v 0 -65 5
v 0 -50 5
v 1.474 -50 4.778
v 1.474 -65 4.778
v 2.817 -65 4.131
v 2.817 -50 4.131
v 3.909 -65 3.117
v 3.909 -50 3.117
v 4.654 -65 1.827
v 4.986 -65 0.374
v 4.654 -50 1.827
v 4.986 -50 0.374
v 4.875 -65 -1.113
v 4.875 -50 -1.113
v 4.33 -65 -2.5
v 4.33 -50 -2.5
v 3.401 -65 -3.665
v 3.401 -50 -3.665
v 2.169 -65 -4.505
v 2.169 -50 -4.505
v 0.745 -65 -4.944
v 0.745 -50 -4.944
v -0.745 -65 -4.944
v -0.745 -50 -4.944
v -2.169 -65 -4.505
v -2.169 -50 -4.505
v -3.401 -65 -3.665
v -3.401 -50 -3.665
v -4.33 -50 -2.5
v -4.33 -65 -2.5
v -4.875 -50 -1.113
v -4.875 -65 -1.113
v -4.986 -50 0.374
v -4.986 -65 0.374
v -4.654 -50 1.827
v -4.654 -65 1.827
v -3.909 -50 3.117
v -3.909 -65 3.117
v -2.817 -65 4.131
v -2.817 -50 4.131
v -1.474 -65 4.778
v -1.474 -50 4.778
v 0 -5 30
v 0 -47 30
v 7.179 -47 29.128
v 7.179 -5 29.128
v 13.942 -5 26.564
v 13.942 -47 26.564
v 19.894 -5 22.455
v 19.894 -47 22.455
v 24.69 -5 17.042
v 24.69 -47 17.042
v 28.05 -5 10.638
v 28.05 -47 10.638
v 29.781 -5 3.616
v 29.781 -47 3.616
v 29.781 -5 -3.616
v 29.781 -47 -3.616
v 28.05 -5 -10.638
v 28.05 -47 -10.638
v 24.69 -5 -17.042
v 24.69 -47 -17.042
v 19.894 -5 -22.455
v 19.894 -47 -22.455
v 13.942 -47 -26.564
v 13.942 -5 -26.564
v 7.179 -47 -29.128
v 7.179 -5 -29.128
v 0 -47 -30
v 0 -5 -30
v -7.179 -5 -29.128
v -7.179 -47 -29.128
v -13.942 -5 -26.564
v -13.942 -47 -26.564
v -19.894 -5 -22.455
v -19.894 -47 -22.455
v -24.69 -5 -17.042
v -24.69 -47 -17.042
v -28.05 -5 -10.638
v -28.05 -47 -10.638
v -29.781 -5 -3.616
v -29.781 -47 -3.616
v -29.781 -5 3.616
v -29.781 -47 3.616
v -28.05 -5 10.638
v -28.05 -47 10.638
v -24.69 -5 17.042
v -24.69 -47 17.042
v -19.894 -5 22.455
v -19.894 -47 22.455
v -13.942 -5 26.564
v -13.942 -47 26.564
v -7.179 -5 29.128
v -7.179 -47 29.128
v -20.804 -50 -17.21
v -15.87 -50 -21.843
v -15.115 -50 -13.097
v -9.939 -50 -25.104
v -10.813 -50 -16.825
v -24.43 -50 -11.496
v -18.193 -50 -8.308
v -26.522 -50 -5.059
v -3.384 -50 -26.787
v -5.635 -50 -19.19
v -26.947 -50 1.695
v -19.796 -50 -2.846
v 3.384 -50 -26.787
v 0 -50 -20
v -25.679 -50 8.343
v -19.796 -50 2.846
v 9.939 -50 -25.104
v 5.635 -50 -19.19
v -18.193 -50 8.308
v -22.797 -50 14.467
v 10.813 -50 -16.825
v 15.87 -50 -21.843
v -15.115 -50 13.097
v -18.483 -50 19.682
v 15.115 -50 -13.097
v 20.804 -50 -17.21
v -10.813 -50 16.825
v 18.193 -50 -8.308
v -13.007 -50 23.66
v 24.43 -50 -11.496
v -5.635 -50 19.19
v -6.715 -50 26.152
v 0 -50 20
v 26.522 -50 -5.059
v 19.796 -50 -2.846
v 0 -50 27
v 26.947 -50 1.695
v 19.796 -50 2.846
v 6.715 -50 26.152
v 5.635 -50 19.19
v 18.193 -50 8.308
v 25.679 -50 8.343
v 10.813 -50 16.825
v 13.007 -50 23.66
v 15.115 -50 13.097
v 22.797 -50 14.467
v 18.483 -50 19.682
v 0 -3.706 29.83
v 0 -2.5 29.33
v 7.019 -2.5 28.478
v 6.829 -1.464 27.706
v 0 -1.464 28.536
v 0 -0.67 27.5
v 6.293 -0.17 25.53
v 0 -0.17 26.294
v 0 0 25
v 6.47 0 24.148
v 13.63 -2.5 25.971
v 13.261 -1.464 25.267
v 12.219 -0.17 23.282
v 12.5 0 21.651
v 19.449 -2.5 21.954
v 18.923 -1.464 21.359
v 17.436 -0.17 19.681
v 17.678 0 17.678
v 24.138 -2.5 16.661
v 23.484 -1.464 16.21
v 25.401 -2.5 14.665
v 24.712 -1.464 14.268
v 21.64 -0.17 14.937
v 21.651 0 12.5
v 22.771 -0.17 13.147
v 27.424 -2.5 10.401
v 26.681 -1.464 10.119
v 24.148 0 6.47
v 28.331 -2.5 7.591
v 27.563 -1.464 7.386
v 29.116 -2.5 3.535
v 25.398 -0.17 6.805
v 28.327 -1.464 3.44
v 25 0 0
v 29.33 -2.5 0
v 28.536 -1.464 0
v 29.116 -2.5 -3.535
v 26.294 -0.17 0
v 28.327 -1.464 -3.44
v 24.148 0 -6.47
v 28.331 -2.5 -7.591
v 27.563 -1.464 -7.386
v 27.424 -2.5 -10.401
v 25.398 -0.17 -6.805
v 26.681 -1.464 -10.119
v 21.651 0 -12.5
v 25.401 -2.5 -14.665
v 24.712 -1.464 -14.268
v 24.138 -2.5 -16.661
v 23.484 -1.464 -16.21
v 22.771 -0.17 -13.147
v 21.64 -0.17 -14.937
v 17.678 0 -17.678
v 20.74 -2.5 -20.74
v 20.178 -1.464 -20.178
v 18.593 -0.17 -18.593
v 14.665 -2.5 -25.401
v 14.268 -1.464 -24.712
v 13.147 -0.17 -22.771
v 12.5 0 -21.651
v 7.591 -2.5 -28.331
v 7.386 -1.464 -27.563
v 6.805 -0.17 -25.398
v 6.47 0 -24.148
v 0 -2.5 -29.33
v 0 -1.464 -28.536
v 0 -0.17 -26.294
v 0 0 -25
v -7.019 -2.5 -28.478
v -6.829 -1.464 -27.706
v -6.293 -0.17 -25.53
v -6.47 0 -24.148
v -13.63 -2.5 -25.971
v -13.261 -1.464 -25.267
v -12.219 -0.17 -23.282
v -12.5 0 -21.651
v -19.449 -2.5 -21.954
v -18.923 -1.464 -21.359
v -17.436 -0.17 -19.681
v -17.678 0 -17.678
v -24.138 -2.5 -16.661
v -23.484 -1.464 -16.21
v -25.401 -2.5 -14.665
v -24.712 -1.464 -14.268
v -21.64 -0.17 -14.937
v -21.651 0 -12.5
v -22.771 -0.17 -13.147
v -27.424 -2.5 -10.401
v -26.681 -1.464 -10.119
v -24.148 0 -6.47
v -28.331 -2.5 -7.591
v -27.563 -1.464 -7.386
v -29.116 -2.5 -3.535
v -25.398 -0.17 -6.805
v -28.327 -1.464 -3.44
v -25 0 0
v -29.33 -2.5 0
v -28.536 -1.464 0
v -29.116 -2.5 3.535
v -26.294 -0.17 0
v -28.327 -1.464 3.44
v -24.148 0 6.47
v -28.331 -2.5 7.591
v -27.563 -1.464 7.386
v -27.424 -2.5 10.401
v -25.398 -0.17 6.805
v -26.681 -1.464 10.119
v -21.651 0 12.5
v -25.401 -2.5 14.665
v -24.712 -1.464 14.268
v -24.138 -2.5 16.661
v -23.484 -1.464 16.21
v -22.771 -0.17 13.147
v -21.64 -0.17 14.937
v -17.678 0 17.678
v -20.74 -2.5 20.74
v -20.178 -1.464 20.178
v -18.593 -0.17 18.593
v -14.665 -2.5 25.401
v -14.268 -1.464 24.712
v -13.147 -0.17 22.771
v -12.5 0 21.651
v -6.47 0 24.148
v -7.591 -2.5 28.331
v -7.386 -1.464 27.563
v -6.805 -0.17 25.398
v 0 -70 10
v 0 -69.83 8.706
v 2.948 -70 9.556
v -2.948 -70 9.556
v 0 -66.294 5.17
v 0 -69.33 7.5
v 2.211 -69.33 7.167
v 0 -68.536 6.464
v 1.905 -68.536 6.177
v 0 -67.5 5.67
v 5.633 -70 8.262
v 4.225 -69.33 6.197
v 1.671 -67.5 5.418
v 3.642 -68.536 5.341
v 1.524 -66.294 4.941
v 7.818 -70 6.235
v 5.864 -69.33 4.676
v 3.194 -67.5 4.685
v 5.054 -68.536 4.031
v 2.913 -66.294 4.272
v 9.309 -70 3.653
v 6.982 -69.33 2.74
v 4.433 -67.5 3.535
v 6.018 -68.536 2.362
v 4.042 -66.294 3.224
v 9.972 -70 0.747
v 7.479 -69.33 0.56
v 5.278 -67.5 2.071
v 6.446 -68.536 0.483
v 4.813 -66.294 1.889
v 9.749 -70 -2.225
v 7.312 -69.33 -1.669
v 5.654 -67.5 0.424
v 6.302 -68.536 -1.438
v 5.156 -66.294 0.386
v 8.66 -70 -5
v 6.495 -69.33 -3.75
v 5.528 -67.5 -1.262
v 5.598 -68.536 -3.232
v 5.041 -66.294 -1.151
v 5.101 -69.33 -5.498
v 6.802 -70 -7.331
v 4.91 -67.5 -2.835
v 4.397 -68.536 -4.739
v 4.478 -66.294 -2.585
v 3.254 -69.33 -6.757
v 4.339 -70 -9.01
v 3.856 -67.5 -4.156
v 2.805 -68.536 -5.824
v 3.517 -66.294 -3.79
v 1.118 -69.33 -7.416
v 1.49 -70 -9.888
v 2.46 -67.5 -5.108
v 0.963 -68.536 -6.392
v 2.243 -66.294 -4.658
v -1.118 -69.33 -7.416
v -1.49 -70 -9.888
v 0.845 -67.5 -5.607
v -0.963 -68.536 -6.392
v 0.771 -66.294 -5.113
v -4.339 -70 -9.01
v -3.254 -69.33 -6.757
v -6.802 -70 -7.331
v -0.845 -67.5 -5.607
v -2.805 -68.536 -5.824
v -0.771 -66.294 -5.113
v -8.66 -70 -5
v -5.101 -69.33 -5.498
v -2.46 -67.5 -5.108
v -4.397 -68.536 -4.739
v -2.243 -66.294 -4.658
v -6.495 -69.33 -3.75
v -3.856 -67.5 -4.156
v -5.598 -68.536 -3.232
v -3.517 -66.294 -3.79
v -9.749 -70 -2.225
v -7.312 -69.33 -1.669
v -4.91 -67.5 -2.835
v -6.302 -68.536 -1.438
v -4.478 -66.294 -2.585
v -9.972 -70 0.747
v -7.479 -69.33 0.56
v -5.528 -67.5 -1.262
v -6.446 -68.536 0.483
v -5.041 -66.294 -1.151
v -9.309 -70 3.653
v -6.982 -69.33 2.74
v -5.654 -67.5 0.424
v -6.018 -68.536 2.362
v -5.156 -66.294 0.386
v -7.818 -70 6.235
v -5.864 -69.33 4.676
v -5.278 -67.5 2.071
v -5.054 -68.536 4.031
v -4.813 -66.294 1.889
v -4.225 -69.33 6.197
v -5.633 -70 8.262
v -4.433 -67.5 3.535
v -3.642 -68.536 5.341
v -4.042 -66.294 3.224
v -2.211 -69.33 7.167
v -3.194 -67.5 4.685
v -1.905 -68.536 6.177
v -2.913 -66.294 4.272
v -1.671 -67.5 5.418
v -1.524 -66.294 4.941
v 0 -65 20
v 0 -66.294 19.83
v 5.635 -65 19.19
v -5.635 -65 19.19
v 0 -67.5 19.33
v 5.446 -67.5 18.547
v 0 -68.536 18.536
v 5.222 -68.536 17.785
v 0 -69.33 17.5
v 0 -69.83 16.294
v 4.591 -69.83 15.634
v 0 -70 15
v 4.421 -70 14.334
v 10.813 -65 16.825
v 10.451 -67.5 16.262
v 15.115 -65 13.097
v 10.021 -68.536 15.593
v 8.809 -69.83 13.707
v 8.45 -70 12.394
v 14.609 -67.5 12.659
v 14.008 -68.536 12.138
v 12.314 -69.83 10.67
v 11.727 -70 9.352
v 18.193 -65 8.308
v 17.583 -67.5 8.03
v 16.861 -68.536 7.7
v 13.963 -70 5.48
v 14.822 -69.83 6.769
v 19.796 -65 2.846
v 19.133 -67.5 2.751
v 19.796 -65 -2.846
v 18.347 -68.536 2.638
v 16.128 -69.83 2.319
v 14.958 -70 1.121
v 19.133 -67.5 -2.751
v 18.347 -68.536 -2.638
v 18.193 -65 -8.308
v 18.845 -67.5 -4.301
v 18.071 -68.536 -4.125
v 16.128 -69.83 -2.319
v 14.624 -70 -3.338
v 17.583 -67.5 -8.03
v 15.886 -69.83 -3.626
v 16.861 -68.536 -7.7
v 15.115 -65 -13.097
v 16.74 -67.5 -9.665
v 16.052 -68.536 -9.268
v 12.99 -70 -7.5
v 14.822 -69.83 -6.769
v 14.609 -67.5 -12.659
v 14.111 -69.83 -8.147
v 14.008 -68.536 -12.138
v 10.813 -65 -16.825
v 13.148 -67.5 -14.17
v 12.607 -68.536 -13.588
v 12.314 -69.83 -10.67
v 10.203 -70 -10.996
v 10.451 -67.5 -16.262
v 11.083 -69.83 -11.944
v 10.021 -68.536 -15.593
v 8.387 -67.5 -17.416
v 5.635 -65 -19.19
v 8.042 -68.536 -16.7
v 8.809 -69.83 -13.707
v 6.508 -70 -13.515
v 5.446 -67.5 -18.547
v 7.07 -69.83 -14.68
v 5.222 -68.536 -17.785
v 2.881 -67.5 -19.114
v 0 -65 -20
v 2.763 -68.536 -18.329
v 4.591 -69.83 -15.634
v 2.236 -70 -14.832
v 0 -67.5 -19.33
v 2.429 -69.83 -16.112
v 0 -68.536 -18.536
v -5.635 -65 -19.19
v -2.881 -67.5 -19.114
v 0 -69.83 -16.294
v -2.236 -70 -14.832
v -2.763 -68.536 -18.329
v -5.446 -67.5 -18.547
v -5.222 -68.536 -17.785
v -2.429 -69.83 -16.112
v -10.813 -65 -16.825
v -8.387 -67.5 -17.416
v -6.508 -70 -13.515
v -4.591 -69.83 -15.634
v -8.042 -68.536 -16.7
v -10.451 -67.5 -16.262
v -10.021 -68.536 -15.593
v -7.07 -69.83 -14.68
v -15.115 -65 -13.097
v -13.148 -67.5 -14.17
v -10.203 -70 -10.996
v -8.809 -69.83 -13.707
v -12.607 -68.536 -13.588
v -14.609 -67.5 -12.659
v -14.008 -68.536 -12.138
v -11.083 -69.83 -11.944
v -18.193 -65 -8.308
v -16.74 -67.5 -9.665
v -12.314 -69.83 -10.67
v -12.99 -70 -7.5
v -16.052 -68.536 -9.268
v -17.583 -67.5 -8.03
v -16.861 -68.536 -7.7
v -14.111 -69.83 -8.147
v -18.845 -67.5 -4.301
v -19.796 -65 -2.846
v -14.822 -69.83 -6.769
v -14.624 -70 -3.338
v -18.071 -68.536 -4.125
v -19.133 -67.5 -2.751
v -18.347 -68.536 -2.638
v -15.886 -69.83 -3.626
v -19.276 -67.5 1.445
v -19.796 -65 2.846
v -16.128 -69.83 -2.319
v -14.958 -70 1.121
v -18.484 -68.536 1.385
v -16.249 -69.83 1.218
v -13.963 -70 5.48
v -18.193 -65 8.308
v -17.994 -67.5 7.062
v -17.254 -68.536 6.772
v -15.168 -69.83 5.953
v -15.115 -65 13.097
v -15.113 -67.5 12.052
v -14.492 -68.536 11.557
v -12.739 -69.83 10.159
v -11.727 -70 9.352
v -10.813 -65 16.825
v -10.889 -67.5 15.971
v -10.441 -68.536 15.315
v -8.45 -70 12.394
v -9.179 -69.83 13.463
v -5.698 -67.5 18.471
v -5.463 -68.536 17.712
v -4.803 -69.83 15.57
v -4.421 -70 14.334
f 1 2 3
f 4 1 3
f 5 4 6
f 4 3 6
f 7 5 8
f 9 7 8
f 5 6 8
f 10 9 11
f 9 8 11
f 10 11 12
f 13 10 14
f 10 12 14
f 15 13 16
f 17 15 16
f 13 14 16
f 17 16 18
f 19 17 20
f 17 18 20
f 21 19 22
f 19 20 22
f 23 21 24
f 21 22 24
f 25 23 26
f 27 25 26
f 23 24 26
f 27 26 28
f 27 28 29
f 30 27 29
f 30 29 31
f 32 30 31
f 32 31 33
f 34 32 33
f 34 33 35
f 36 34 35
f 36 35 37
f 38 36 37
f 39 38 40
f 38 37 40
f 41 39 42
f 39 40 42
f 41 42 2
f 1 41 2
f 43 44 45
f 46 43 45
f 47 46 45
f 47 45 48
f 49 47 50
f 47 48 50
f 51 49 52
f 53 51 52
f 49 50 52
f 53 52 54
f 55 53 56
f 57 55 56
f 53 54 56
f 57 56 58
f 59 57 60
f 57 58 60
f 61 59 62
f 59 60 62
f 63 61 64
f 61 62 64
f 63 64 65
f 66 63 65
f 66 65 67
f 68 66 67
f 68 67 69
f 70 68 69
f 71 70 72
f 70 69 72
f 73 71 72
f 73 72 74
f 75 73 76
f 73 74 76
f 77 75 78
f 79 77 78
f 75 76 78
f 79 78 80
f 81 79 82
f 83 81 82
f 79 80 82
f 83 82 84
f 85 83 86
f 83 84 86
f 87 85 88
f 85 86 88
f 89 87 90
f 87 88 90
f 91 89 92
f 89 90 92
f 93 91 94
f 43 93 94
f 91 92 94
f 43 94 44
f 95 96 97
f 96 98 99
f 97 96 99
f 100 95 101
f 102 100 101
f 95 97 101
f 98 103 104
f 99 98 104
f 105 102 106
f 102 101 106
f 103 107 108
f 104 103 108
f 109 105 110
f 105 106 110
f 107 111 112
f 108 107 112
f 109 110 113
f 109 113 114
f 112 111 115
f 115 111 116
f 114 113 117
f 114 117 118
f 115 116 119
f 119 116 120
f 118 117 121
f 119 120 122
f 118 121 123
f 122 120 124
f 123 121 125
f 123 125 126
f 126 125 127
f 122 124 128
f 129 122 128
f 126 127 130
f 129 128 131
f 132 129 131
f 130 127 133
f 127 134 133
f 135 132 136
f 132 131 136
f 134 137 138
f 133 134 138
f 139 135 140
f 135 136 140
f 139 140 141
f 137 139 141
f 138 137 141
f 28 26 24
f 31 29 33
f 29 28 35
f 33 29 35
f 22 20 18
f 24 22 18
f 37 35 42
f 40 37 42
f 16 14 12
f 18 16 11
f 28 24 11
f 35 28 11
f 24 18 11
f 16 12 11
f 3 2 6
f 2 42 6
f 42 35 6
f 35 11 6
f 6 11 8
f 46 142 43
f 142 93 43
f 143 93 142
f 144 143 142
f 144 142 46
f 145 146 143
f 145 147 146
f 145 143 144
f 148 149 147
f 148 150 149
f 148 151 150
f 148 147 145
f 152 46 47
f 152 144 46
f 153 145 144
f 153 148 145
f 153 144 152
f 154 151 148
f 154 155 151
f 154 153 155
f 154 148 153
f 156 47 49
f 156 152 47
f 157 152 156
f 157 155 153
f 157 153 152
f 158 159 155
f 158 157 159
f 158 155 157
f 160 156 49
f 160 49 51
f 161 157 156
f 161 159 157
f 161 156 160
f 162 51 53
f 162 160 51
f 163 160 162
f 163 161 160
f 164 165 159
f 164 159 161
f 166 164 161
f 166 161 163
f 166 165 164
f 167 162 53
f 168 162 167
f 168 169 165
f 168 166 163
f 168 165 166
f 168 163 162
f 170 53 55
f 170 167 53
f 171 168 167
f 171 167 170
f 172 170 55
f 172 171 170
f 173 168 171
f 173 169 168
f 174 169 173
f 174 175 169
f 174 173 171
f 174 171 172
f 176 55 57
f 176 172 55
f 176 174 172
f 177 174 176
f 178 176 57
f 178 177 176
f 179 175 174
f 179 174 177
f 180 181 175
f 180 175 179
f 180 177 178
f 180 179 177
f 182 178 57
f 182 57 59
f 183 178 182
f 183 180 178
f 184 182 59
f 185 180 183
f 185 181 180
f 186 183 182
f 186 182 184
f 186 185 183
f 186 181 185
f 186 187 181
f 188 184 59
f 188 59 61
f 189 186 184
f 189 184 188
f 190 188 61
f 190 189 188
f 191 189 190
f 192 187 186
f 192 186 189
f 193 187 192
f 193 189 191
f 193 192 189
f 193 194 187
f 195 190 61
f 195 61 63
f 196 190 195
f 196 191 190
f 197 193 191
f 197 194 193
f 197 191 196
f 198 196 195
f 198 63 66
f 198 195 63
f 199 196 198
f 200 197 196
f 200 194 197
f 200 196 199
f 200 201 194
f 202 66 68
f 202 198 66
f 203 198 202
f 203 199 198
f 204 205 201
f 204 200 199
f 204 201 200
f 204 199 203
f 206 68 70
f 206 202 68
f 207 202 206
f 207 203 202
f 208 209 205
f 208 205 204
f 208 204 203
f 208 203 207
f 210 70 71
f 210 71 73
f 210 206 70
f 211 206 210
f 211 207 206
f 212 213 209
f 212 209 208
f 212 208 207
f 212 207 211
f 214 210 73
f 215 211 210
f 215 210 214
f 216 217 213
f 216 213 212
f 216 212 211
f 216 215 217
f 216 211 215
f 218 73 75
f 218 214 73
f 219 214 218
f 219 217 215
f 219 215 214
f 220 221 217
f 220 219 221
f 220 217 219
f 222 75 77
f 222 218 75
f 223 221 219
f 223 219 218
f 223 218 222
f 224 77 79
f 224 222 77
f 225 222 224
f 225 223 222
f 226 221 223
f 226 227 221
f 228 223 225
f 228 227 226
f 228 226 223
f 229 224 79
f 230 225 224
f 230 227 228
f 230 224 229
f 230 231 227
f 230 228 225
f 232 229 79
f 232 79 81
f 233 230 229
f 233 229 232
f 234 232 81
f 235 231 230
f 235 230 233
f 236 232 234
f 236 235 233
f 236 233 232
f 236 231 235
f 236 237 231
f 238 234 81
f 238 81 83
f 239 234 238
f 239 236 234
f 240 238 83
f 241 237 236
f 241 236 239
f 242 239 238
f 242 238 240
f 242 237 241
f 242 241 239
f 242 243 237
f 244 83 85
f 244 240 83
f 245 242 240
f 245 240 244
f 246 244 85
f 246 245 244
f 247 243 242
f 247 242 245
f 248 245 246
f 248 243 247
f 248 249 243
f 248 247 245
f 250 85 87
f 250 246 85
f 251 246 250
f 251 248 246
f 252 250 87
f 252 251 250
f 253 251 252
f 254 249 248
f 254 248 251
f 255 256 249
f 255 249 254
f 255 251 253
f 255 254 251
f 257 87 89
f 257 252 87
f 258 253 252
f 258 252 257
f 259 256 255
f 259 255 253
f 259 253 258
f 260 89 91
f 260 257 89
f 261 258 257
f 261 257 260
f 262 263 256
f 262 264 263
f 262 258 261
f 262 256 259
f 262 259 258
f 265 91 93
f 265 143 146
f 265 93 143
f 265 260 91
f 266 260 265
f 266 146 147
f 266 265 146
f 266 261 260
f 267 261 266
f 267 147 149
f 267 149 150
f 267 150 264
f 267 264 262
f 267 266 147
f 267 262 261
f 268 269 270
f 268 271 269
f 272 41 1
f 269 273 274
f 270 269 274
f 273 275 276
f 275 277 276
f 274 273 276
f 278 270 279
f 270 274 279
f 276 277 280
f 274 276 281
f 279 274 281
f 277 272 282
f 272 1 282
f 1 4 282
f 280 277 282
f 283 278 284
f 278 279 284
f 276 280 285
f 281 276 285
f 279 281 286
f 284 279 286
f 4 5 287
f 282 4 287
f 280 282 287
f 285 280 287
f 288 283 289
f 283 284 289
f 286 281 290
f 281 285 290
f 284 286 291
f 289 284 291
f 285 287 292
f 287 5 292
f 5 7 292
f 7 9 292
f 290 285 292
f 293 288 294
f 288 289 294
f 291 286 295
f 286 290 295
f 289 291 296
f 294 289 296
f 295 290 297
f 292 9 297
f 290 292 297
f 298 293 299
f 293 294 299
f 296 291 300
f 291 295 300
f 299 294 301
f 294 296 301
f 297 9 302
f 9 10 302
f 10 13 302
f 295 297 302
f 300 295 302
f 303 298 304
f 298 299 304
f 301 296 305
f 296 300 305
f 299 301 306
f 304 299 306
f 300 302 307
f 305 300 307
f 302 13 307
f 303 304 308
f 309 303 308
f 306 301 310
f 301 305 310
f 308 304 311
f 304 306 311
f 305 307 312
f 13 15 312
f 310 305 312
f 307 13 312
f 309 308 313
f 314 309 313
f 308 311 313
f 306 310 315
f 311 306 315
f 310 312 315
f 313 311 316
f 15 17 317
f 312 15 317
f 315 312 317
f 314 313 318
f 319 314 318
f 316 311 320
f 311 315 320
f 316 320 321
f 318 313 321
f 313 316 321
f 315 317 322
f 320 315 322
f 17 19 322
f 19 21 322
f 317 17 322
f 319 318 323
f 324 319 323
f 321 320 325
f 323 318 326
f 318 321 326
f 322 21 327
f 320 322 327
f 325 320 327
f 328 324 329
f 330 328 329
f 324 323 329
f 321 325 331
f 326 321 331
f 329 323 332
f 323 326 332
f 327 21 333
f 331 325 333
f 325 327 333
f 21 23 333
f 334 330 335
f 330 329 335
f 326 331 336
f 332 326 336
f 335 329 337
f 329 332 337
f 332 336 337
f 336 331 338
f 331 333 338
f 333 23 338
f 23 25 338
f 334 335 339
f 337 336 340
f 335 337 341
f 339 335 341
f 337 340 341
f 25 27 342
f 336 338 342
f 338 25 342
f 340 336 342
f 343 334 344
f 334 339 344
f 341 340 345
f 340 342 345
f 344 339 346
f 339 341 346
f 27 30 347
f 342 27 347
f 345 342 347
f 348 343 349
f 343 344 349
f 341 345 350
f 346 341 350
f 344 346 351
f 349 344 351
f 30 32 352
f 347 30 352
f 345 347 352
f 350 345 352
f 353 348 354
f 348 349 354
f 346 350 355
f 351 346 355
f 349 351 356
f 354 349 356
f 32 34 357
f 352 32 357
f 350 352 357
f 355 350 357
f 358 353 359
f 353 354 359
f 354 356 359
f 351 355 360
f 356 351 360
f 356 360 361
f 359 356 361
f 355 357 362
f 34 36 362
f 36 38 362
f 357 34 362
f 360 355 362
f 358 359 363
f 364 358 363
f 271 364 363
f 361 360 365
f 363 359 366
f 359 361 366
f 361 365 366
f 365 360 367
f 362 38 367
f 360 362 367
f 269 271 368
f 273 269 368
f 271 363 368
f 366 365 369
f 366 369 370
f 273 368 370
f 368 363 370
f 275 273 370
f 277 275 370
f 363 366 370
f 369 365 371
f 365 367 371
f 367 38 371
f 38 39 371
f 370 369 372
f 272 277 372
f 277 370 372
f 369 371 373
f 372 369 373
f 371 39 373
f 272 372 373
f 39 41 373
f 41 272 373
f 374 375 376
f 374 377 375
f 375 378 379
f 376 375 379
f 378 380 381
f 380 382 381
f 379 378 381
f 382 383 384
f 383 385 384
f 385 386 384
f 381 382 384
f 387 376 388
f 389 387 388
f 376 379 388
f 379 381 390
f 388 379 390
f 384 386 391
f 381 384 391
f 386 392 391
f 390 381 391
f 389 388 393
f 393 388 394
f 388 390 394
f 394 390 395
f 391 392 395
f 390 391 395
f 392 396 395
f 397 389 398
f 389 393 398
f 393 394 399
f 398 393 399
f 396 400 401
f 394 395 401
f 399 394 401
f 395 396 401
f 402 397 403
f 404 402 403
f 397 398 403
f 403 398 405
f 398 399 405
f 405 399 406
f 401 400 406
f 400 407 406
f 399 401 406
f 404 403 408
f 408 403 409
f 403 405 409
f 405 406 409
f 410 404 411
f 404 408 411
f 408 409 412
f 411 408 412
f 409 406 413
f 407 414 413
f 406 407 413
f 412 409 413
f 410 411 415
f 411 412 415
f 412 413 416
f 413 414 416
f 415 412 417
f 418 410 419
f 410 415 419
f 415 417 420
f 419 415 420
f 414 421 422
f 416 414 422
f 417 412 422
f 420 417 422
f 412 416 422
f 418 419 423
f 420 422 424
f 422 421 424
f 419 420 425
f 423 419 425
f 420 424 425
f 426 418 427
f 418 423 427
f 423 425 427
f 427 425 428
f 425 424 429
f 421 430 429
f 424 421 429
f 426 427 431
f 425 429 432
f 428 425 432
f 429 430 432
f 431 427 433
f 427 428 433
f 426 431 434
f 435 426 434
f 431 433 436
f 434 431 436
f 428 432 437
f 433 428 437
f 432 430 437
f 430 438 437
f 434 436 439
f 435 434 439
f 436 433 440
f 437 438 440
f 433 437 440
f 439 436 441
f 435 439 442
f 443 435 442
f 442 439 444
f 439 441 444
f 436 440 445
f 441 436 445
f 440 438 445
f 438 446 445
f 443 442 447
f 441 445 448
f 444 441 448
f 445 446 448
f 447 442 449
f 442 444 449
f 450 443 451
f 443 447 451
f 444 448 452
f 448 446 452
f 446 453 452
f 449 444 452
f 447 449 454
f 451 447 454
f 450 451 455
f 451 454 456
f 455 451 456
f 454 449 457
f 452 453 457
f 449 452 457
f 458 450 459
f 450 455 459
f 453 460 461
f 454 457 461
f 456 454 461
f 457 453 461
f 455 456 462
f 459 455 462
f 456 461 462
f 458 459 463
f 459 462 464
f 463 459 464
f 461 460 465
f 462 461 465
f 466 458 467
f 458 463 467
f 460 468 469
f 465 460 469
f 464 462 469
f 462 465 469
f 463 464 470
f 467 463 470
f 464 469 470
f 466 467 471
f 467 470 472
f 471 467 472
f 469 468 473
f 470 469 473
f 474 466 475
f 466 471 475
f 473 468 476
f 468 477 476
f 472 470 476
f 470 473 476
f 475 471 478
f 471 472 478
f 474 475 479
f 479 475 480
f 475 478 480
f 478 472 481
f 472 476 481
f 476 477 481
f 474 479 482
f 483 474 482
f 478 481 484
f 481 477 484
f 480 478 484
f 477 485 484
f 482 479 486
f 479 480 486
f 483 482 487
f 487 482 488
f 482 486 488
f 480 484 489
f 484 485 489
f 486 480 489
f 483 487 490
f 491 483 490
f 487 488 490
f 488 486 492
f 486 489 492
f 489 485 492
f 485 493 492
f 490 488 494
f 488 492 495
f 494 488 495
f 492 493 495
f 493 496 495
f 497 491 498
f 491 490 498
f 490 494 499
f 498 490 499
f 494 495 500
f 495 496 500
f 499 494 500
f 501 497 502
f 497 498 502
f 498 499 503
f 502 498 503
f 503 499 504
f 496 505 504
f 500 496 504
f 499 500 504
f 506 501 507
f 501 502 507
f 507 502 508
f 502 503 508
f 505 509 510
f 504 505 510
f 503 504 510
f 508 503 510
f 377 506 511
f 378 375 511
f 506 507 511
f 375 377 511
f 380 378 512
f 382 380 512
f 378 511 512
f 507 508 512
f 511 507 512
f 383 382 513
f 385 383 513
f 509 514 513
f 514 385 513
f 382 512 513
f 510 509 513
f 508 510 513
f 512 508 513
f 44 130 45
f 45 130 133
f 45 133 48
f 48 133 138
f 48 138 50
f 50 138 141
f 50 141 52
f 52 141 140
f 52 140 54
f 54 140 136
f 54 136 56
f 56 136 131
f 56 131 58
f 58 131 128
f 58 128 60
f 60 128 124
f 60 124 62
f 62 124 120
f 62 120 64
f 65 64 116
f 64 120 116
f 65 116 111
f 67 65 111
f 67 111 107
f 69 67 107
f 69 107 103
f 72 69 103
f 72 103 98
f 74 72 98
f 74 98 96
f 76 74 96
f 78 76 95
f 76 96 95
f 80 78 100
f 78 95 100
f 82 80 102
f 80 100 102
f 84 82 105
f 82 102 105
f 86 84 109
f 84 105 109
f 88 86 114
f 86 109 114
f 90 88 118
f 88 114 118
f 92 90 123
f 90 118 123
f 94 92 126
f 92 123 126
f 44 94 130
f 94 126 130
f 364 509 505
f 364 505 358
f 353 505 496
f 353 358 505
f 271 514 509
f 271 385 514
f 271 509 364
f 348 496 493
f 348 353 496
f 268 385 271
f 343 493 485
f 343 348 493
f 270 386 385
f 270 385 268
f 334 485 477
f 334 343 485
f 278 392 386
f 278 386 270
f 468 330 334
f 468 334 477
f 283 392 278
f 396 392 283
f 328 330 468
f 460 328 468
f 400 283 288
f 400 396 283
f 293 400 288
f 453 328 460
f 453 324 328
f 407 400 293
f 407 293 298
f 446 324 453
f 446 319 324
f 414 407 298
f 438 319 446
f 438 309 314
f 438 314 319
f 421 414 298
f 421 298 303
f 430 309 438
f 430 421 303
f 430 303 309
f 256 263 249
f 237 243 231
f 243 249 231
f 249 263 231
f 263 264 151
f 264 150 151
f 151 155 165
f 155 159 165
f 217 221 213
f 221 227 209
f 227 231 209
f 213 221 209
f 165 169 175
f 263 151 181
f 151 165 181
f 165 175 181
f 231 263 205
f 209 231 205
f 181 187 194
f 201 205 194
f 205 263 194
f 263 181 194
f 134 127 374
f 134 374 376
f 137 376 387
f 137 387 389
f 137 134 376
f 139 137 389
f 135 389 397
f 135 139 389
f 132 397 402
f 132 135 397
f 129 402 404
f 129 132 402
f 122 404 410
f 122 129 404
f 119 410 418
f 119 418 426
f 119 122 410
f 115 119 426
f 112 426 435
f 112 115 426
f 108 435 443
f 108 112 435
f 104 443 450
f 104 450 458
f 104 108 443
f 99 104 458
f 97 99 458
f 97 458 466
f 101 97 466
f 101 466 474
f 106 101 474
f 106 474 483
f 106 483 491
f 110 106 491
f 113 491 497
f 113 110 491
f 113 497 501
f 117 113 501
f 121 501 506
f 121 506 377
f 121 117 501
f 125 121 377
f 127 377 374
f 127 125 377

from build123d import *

# Parameters (mm, degrees)
F0_W    = 20
F0_H    = 15
F0_W_2  = 42.9629645813
F2_SIZE = 3
F3_R    = 5


with BuildPart() as f1:
    # F0 (on Right) → F1 (revolve)
    with BuildSketch(Plane.YZ):
        with Locations((-60, 12.5)):
            Rectangle(F0_W, F0_H)
        Polygon((0, 30), (-50, 30), (-50, 20), (-7.0370354187, 20), (-7.0370354187, 5), (-50, 5), (-50, 0), (0, 0), align=None)
        with Locations((-28.5185177093, 12.5)):
            Rectangle(F0_W_2, F0_H)
    revolve(axis=Axis((0, -25, 0), (0, 1, 0)))

    # F2
    f2_edges = [f1.edges().sort_by_distance(p)[0] for p in [
        (0, -50, -30),
    ]]
    chamfer(f2_edges, length=F2_SIZE)

    # F3
    f3_edges = [f1.edges().sort_by_distance(p)[0] for p in [
        (0, -70, -20),
        (0, -70, -5),
        (0, 0, -30),
    ]]
    fillet(f3_edges, radius=F3_R)


solid = f1.part
